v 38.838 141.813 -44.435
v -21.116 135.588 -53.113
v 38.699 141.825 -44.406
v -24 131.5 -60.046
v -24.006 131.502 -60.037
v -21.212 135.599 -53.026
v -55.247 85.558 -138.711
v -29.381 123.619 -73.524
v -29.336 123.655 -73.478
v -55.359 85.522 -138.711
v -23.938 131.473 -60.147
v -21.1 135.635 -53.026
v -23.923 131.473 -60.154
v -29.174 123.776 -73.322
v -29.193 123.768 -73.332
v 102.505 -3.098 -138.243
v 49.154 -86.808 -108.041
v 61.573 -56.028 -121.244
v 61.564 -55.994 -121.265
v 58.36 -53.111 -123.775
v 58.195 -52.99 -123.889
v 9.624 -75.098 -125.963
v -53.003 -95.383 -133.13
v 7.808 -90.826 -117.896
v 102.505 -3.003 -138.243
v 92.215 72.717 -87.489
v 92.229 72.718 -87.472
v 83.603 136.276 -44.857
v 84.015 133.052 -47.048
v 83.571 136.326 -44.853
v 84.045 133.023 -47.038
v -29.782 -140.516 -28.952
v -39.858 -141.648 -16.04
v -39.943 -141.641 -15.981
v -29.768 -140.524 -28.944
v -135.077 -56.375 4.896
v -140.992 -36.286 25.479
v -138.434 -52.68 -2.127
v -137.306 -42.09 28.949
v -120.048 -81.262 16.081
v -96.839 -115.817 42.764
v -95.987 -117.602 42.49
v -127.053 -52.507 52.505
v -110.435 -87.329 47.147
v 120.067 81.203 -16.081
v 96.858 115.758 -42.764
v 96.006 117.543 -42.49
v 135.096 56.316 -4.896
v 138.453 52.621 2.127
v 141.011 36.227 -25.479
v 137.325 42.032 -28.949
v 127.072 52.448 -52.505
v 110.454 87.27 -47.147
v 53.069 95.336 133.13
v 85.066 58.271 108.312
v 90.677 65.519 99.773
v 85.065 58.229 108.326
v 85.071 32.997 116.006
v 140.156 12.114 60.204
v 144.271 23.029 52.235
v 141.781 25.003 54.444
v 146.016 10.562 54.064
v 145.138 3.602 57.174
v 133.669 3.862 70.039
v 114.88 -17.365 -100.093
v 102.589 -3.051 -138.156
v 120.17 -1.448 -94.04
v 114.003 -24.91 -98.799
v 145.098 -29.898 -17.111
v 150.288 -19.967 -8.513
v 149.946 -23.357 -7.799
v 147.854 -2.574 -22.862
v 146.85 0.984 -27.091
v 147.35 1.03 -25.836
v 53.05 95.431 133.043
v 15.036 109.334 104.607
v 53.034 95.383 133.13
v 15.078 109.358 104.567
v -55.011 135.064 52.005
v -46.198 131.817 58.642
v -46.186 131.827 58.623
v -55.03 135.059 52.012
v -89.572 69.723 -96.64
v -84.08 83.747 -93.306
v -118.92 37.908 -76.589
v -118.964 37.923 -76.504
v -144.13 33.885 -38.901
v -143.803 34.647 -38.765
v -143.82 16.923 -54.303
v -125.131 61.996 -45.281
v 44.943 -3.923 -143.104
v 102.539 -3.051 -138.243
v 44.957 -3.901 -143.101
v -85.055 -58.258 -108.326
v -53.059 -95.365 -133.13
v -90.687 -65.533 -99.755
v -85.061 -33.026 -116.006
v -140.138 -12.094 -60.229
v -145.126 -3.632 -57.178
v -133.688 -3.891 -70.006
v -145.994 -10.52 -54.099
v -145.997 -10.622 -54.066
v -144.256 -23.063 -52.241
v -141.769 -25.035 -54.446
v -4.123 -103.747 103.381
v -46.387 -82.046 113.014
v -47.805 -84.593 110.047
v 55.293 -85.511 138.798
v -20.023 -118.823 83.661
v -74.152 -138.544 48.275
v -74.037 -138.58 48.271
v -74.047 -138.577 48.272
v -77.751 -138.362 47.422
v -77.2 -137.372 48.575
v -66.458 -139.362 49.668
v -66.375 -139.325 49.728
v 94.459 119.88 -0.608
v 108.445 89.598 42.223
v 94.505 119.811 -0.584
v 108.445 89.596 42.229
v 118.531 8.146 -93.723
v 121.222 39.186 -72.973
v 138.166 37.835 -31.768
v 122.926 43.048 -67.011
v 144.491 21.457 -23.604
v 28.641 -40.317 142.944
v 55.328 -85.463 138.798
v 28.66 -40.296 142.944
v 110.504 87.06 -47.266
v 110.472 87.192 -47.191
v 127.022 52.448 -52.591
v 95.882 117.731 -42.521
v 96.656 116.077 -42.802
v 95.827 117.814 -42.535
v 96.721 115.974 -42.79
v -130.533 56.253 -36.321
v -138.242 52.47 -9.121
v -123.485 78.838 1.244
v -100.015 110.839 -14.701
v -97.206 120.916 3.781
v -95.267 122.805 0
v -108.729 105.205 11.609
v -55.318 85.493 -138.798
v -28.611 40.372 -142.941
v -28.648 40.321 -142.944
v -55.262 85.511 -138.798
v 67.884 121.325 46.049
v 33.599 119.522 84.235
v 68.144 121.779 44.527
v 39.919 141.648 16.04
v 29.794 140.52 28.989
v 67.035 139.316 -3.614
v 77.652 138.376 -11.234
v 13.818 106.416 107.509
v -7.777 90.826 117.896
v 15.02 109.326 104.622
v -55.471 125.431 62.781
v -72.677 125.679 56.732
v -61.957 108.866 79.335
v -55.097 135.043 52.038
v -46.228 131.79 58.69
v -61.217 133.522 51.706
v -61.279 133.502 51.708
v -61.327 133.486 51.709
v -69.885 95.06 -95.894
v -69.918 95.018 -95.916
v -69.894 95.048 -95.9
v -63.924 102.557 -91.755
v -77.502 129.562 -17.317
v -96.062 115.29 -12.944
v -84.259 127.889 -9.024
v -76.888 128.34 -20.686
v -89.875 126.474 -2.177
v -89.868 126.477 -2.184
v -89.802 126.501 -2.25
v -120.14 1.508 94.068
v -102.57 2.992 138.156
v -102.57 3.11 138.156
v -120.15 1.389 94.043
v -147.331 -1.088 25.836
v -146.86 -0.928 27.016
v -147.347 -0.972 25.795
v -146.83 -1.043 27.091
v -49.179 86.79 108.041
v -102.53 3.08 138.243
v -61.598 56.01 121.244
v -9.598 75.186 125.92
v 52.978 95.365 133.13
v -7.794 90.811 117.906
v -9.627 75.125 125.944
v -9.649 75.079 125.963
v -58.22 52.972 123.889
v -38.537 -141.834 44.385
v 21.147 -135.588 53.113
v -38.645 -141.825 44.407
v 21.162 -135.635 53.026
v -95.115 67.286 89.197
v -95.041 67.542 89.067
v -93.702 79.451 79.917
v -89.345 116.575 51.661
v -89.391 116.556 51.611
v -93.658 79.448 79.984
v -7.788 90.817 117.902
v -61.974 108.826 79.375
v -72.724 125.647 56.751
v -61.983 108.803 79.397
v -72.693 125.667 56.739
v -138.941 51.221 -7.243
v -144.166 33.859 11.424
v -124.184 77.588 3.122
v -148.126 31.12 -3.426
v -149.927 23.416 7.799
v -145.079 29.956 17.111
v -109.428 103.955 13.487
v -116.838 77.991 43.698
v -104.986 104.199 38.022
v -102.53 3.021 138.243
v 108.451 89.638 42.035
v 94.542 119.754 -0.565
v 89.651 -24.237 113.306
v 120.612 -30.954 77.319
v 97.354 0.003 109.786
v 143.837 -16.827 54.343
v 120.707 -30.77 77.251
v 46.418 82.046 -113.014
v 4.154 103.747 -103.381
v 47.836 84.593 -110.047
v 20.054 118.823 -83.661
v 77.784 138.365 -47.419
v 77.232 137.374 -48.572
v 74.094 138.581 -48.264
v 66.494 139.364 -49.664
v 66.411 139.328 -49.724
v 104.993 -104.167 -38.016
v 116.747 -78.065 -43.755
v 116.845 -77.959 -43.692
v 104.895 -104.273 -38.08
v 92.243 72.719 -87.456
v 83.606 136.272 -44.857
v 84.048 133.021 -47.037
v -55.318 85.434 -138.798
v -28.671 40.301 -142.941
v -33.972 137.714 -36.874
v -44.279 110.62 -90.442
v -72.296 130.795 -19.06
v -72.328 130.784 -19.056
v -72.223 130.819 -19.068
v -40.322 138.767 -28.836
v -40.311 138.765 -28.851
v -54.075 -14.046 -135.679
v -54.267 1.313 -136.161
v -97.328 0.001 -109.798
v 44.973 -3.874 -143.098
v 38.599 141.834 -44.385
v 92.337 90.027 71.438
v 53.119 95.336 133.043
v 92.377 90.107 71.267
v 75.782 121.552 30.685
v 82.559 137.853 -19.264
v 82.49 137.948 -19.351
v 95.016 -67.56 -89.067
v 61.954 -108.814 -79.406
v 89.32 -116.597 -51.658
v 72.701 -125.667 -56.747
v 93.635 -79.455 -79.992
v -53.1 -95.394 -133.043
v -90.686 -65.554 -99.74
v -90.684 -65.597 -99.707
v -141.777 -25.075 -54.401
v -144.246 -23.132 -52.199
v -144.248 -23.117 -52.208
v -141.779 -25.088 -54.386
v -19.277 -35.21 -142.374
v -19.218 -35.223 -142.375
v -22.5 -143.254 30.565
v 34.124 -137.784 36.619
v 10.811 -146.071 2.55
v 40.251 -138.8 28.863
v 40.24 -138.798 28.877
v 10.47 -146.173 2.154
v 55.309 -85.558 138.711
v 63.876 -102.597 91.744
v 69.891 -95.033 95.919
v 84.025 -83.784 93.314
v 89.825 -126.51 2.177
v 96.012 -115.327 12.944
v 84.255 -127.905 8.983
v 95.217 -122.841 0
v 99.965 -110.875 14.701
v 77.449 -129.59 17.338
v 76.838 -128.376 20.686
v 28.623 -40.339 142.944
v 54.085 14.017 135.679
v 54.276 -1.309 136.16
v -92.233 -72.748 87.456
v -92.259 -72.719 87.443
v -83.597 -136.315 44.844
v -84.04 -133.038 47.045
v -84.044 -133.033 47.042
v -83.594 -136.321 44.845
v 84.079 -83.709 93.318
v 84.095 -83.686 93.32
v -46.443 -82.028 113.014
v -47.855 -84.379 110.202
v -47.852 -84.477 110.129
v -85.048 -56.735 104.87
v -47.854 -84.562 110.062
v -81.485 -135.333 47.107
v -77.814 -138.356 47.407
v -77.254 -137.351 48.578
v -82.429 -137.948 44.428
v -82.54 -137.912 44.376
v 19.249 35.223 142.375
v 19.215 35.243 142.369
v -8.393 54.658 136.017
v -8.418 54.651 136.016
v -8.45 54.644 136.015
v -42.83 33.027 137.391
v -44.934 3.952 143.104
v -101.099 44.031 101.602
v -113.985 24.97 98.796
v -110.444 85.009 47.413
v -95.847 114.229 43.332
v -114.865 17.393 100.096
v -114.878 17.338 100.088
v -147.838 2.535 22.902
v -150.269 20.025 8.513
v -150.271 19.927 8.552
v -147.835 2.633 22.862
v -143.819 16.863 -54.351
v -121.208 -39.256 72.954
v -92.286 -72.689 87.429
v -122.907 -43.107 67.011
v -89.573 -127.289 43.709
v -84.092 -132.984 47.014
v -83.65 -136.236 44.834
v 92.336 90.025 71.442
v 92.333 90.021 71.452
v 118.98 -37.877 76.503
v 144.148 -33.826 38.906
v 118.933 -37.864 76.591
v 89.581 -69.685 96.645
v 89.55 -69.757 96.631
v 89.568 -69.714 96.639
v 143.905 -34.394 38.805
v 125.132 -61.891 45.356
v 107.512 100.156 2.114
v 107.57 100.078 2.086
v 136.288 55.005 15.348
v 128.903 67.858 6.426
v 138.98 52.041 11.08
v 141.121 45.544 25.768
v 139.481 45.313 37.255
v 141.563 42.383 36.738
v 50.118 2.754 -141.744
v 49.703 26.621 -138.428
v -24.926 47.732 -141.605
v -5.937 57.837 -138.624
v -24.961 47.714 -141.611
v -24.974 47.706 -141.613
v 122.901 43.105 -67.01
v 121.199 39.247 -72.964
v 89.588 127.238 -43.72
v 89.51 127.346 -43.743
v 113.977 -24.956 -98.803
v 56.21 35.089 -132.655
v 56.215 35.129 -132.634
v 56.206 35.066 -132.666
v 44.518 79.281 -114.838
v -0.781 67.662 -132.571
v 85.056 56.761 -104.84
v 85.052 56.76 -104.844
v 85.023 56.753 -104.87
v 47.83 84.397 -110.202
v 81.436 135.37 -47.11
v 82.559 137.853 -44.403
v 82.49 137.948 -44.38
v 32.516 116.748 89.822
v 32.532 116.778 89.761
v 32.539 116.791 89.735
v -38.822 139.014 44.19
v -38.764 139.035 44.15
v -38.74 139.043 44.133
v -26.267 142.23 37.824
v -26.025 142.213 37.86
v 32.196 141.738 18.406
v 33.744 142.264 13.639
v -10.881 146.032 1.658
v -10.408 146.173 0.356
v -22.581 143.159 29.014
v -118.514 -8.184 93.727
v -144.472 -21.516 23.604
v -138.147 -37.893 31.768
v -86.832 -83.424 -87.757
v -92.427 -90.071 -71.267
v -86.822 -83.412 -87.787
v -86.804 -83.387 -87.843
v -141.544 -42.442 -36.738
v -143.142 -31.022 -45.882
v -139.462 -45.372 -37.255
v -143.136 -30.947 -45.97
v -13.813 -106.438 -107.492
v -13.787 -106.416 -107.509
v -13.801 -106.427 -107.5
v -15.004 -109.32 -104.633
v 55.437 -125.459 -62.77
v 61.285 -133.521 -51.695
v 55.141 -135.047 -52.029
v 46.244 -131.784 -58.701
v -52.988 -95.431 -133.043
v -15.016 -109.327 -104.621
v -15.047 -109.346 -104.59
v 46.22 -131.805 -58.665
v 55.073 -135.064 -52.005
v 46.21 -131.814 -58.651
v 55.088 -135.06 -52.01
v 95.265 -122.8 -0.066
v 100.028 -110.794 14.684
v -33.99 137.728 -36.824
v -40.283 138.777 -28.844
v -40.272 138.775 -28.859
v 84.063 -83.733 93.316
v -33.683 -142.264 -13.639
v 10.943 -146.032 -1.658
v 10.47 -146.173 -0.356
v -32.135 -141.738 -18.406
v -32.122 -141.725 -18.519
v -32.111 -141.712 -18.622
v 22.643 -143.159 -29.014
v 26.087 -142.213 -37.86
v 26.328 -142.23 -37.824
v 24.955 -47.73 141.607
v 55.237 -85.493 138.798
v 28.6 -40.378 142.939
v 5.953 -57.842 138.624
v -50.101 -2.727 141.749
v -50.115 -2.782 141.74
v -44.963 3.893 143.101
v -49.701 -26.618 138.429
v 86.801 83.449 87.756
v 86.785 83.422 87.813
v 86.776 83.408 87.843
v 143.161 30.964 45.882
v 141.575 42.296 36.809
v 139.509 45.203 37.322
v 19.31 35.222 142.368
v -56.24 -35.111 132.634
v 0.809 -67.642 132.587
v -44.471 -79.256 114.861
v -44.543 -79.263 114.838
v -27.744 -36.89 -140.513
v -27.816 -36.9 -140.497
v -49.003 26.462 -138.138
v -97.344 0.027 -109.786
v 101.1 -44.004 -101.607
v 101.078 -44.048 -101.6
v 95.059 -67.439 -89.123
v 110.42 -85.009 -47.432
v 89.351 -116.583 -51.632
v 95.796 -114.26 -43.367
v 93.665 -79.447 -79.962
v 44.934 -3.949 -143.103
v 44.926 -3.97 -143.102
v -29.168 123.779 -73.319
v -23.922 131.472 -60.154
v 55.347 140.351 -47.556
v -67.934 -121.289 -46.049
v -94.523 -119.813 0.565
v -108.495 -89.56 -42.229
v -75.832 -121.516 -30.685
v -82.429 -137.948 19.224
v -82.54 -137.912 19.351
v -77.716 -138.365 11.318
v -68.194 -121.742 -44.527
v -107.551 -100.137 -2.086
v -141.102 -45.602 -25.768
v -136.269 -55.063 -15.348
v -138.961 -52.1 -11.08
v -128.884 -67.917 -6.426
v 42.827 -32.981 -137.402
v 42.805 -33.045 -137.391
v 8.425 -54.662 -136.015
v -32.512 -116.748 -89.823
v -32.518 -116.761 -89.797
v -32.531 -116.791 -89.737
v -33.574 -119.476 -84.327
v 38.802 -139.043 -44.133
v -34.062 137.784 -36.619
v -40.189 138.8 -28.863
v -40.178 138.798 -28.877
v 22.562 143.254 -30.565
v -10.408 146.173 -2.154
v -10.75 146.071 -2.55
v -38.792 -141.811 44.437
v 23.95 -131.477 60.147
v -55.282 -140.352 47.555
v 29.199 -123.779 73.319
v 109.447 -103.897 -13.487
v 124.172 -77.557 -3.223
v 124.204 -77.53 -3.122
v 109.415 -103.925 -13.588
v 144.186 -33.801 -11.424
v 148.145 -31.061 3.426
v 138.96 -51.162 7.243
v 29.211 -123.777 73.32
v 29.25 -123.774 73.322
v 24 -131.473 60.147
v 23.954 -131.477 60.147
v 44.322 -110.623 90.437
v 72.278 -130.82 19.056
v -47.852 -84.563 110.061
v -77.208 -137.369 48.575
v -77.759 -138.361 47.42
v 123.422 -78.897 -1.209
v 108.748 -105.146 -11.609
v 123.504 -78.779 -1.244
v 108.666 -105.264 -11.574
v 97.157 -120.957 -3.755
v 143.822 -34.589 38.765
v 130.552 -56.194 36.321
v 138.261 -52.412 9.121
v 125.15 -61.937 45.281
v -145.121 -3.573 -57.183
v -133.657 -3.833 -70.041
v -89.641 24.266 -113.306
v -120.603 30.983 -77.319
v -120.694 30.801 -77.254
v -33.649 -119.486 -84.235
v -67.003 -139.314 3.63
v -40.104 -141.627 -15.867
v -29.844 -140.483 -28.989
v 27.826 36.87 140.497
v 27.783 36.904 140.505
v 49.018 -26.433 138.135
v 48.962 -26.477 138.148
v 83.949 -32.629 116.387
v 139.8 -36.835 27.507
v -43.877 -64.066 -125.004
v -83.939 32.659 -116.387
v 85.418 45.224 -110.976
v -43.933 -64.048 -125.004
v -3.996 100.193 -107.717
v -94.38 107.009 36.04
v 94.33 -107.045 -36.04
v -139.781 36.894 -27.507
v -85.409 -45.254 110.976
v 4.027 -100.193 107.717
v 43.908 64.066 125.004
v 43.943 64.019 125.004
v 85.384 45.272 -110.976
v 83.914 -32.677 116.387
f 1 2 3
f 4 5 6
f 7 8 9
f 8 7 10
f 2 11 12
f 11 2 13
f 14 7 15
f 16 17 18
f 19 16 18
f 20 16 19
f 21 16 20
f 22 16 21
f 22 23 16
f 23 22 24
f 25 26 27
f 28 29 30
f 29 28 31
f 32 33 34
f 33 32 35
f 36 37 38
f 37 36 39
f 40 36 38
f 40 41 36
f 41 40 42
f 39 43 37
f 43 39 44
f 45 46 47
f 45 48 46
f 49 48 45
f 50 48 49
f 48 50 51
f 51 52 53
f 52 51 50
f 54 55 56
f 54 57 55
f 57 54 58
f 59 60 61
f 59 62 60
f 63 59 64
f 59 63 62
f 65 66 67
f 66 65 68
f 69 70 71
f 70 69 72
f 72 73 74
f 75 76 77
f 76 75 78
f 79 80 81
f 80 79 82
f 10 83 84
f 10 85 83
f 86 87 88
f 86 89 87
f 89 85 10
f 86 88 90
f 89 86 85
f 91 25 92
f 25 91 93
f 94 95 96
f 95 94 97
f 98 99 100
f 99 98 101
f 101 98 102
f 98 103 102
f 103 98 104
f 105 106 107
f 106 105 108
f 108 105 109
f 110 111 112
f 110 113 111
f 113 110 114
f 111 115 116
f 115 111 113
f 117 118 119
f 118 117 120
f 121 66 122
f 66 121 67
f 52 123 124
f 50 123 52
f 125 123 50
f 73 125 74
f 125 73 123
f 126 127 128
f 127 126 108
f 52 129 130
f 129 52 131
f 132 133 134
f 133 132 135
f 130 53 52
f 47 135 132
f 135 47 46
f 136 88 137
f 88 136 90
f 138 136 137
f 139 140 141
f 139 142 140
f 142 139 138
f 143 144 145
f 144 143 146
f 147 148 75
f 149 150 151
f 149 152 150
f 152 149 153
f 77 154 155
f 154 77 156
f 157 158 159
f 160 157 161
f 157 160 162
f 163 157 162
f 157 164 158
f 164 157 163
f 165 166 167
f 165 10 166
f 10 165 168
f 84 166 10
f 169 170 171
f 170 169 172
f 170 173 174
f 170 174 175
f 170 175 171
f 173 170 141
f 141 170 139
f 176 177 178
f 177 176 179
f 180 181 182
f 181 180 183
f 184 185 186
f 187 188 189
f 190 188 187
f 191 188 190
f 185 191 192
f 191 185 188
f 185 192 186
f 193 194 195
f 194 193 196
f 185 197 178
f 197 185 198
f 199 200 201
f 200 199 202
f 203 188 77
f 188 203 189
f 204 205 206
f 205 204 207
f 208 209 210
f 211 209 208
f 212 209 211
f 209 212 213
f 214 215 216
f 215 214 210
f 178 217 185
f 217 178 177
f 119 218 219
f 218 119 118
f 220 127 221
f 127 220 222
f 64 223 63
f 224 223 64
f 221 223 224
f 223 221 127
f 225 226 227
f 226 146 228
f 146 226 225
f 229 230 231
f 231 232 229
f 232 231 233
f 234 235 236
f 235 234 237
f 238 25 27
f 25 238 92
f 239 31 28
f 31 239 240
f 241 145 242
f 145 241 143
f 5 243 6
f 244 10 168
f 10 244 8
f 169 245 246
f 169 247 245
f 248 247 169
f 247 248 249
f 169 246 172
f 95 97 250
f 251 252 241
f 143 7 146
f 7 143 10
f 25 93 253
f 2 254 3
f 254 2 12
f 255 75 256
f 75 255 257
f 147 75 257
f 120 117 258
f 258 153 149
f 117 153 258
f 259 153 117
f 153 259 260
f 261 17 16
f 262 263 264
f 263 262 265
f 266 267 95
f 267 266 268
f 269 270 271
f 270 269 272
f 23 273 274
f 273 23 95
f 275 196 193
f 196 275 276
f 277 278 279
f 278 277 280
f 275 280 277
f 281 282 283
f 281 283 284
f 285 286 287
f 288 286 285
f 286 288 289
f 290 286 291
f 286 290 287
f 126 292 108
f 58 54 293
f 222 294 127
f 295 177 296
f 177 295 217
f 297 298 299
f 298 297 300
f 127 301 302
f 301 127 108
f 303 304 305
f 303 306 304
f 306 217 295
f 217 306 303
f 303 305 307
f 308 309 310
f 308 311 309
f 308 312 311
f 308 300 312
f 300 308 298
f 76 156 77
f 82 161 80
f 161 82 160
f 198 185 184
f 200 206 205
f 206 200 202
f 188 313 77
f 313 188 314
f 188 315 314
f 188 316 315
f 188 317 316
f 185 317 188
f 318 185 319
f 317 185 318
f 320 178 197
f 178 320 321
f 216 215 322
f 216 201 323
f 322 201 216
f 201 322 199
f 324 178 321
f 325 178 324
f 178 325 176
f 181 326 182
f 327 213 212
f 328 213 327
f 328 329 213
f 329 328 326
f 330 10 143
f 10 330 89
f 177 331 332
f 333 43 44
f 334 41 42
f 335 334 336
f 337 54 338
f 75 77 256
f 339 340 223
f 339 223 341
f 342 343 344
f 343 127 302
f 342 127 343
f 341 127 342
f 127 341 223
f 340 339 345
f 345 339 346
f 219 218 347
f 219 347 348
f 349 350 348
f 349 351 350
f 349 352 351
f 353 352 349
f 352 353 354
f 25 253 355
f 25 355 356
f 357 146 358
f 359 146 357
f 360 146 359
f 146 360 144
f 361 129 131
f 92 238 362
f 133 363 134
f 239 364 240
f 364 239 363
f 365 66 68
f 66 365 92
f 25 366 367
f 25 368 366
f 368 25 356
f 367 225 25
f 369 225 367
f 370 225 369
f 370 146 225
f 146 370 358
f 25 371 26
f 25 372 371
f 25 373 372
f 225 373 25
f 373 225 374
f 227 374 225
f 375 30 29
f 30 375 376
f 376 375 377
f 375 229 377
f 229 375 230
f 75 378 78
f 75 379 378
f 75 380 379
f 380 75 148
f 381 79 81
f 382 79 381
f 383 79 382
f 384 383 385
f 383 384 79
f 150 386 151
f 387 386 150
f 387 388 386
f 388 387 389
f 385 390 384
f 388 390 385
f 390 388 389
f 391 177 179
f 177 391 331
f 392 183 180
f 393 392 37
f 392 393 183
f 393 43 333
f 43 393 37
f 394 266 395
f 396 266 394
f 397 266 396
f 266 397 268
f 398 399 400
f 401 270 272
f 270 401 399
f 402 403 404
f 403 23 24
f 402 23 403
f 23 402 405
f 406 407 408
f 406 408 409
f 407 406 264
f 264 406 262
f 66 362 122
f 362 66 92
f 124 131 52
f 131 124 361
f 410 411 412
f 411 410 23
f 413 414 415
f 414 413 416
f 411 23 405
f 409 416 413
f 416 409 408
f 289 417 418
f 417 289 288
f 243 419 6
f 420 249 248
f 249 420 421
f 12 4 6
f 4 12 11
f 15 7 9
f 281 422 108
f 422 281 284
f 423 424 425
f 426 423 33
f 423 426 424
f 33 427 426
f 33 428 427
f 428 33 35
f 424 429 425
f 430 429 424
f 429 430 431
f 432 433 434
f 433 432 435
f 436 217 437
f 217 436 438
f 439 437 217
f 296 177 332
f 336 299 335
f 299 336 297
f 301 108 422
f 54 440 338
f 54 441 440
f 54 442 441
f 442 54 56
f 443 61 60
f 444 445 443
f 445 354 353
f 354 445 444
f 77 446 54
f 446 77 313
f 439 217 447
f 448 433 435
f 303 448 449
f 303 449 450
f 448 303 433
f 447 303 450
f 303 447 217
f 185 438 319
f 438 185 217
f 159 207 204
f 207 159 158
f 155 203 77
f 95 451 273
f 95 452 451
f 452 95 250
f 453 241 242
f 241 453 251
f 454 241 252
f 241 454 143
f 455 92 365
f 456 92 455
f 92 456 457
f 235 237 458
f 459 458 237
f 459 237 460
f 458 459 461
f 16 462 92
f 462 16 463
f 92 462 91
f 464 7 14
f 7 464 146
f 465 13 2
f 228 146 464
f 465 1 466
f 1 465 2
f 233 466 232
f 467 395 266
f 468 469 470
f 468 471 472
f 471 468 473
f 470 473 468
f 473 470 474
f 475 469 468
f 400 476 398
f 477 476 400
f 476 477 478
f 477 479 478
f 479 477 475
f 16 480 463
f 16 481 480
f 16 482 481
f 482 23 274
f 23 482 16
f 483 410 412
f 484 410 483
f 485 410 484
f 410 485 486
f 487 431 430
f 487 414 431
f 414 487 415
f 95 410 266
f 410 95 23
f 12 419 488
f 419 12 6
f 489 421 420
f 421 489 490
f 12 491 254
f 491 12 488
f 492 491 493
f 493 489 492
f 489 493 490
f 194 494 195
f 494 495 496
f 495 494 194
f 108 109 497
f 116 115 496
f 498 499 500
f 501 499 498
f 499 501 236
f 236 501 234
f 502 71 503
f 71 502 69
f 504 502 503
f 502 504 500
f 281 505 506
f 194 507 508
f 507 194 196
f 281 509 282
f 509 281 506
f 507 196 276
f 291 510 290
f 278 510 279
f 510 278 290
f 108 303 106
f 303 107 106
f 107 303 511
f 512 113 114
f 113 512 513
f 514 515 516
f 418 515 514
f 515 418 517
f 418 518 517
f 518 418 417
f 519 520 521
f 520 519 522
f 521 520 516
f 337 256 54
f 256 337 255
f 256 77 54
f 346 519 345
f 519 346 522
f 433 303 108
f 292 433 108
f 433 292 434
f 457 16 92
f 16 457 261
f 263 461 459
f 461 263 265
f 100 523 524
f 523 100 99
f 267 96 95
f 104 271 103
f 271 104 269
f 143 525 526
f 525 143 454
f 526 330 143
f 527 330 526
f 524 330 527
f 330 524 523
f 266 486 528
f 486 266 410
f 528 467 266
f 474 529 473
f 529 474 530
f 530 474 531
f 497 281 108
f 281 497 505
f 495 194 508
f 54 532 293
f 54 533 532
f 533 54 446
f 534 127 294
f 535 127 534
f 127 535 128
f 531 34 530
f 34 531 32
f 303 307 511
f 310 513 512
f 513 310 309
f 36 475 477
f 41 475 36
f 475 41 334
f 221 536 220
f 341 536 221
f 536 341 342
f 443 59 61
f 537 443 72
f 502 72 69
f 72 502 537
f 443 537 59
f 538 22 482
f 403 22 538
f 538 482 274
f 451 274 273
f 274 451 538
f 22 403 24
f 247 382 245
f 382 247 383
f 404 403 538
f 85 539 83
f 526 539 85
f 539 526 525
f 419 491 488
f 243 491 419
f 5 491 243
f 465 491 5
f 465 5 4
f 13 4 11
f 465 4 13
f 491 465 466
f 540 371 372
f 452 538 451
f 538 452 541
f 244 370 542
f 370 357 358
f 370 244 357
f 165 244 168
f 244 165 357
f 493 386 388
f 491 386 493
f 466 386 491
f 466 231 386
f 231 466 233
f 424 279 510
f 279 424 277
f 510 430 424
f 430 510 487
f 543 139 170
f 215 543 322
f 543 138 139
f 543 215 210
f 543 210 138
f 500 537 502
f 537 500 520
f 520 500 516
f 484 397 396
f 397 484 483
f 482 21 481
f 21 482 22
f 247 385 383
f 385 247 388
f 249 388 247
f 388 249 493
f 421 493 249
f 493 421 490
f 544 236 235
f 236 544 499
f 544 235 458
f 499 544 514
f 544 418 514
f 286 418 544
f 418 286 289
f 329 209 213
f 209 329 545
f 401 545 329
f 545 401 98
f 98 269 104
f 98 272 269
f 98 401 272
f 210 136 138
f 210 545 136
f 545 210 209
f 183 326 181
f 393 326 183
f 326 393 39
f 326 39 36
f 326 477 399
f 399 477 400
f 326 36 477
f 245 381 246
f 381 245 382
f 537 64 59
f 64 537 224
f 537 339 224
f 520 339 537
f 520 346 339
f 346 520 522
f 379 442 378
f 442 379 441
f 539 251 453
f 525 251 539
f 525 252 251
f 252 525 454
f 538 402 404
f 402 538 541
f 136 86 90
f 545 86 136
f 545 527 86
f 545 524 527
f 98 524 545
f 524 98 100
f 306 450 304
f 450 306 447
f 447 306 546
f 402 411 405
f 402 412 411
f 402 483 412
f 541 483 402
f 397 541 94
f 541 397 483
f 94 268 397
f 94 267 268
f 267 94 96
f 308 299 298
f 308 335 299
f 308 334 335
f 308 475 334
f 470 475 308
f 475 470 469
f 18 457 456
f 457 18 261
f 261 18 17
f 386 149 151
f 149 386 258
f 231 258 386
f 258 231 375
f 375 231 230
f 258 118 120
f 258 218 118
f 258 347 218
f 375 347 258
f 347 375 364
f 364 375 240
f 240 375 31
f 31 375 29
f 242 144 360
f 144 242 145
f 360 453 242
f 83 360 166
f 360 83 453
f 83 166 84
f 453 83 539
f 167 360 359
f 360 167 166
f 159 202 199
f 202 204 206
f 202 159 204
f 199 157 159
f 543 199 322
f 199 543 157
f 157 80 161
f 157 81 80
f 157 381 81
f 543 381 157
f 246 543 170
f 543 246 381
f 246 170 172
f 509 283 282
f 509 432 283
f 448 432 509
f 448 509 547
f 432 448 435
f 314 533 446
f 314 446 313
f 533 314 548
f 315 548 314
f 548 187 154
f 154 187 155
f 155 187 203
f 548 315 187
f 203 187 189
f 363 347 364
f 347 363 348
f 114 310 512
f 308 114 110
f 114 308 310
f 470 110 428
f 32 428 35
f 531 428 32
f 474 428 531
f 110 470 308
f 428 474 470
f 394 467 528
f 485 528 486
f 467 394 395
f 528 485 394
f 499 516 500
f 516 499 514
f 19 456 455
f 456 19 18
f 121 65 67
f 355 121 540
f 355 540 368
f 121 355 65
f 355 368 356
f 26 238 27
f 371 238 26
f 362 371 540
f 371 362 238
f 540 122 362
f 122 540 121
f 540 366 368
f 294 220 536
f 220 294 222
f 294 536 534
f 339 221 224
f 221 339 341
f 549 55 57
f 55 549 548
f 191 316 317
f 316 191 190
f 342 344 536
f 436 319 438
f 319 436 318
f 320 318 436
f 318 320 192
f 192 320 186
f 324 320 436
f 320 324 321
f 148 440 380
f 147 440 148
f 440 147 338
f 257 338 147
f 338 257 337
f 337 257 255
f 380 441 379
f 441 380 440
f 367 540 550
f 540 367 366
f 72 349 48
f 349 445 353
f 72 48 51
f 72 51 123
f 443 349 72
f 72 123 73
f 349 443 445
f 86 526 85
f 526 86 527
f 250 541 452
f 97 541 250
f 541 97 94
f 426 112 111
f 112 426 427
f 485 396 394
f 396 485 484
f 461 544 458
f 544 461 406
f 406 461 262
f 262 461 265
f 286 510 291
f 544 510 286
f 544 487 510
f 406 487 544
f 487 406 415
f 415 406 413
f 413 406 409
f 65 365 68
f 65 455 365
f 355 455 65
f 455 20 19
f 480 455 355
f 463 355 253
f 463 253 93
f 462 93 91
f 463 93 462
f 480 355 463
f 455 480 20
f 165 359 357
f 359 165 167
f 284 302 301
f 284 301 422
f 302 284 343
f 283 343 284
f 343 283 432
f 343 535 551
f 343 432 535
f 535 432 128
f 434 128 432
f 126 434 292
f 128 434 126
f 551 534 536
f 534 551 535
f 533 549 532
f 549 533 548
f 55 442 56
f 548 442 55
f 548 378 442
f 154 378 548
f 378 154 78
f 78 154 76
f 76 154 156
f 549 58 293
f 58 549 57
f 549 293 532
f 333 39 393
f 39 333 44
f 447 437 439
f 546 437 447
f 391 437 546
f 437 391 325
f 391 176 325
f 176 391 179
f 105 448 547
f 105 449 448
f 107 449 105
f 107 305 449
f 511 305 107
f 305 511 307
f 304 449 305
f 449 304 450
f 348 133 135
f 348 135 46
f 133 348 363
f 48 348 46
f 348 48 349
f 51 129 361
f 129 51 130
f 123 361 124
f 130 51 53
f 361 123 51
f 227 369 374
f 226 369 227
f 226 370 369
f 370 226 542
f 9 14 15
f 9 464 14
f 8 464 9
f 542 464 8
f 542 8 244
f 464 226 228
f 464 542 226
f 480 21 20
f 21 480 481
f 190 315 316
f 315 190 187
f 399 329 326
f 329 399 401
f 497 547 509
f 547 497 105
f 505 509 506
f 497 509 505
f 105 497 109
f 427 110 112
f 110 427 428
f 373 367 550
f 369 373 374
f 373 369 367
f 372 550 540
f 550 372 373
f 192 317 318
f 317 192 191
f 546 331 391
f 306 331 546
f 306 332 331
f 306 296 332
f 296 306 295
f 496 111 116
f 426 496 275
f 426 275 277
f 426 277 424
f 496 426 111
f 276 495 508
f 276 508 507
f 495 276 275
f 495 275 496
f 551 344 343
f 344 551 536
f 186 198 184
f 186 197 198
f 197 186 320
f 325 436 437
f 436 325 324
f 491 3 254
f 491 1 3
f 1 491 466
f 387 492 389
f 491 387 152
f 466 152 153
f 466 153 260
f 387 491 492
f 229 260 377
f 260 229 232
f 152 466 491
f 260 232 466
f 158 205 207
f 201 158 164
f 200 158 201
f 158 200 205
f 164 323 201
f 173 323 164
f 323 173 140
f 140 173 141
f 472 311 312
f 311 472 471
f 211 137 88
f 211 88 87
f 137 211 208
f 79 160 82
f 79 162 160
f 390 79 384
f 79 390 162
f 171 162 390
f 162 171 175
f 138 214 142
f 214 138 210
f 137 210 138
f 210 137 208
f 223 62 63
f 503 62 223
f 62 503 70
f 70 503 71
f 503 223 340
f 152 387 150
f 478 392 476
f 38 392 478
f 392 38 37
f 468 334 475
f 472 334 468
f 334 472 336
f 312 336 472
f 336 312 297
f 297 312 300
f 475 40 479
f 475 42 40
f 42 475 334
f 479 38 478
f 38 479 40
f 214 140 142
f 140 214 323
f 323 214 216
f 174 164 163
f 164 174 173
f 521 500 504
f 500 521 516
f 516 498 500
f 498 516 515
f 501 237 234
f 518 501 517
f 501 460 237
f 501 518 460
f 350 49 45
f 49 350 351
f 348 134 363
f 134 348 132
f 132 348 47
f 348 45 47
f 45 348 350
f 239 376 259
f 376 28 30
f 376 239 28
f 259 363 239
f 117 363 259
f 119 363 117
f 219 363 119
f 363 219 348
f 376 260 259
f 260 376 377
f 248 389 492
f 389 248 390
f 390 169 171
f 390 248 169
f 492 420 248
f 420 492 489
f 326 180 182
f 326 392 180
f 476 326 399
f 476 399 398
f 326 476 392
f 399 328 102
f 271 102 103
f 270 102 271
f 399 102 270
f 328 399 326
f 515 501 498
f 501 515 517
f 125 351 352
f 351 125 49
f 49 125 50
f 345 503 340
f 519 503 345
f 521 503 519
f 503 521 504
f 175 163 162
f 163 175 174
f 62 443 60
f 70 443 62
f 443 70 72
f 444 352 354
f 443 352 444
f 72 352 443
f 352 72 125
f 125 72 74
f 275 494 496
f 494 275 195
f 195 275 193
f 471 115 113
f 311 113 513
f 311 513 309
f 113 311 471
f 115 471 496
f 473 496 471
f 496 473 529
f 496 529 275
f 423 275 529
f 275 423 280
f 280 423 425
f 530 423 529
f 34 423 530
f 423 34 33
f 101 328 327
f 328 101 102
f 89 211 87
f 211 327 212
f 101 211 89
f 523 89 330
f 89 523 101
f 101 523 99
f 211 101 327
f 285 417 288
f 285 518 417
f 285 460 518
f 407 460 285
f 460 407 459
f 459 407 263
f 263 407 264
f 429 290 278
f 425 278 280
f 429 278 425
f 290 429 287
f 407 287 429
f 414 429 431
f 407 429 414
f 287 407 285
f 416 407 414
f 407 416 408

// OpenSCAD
// Auto-generated OpenSCAD file

    inner_points = 50*[[3.0282854772205288, -0.5746120397610971, -1.529535228743129], [-1.9570390816772223, 2.488720185113206, -1.3477536187106098], [1.9570390816772214, -2.488720185113205, 1.3477536187106098], [-3.0282854772205297, 0.5746120397610984, 1.529535228743129], [1.6491882886842126, 2.7570563880831456, -1.2324723141499903], [0.08412478963067203, 0.3400356492395892, -3.423078836481171], [-0.08412478963067273, -0.34003564923958784, 3.423078836481171], [-1.6491882886842135, -2.7570563880831447, 1.2324723141499903], [2.8067129791844274, 1.0087891365785524, 1.7160642977896399], [-0.27438704316396, 2.9020325703837075, 1.8284115113194153], [0.27438704316395934, -2.9020325703837067, -1.8284115113194153], [-2.8067129791844283, -1.008789136578551, -1.7160642977896399], [2.793992253010594, -0.7366978719134406, 0.5501480097562201], [-1.8859757024280626, 2.13900189043946, 0.7207952965656333], [1.8859757024280617, -2.139001890439459, -0.7207952965656333], [-2.793992253010595, 0.7366978719134419, -0.5501480097562201], [1.7073672208446276, 0.9044860907197378, -2.217787497007674], [-0.0802214718725859, 2.0029056584985505, -2.1526060335344295], [0.0802214718725852, -2.0029056584985496, 2.1526060335344295], [-1.7073672208446284, -0.9044860907197365, 2.217787497007674], [1.4993662816149618, 2.3909022063260266, 0.829015494635175], [-0.8778519101575467, -1.2803773767356506, -2.4983572790896065], [0.877851910157546, 1.2803773767356519, 2.4983572790896065], [-1.4993662816149627, -2.3909022063260257, -0.829015494635175], [2.6836061407130223, 1.1442811447947425, -0.37504405101045624], [-0.20877312200842071, 2.9215613393688296, -0.2695782276742873], [1.214404499523046, -1.124694419740917, -2.4314735184133838], [-1.6779747631983963, 0.6525857748331707, -2.326007695077215], [1.6779747631983954, -0.6525857748331694, 2.326007695077215], [-1.214404499523047, 1.1246944197409183, 2.4314735184133838], [0.20877312200842, -2.9215613393688287, 0.2695782276742873], [-2.683606140713023, -1.1442811447947412, 0.37504405101045624]];

    outer_points = 50*[[1.7170405994415567, -2.925385609292255, -0.5779797233161679], [1.6439459750532173, 2.925385609292255, -0.7614004280282365], [-1.6439459750532173, -2.925385609292255, 0.7614004280282365], [-1.7170405994415567, 2.925385609292255, 0.5779797233161679], [3.3884043056895363, 0.06101499591362604, 0.5959558500490982], [2.049786207575088, -0.06101499591362604, -2.7631184587813227], [-2.049786207575088, 0.06101499591362604, 2.7631184587813227], [-3.3884043056895363, -0.06101499591362604, -0.5959558500490982], [1.10555227148591, -1.7092633995307511, 2.774228316088349], [1.0603773092190094, 1.9067120739541168, 2.660868086335833], [-1.0603773092190094, -1.9067120739541168, -2.660868086335833], [-1.10555227148591, 1.7092633995307511, -2.774228316088349], [0.4226276221095006, -2.7108029257139314, 1.0605247229436006], [0.35401012372783297, 2.7816021311861725, 0.8883387378035981], [-0.35401012372783297, -2.7816021311861725, -0.8883387378035981], [-0.4226276221095006, 2.7108029257139314, -1.0605247229436006], [2.56565246249082, -1.0489560258770196, -0.9843261626589144], [2.5394429103320135, 1.0489560258770196, -1.050095356596011], [-2.5394429103320135, -1.0489560258770196, 1.050095356596011], [-2.56565246249082, 1.0489560258770196, 0.9843261626589144], [1.991618466078374, 0.09267736315140723, 2.162555453378865], [-0.04164554946986787, -0.09267736315140723, -2.939635326290048], [0.04164554946986787, 0.09267736315140723, 2.939635326290048], [-1.991618466078374, -0.09267736315140723, -2.162555453378865], [2.2270783360740483, -1.6399687421577454, 1.0012012318904389], [2.1846703898511866, 1.7545242629883189, 0.8947844406875329], [0.9704520663631402, -1.7545242629883189, -2.1521260870312755], [0.9280441201402786, 1.6399687421577454, -2.258542878234181], [-0.9280441201402786, -1.6399687421577454, 2.258542878234181], [-0.9704520663631402, 1.7545242629883189, 2.1521260870312755], [-2.1846703898511866, -1.7545242629883189, -0.8947844406875329], [-2.2270783360740483, 1.6399687421577454, -1.0012012318904389]];

    // Convex hull for inner set (I)
    module inner_hull() {
        hull() {
            for (p = inner_points) {
                translate(p) sphere(r=0.1);
            }
        }
    }

    // Convex hull for outer set (O) minus inner hull (O \ I)
    module outer_minus_inner() {
        difference() {
            hull() {
                for (p = outer_points) {
                    translate(p) sphere(r=0.1);
                }
            }
            inner_hull(); // Subtract inner hull
        }
    }

    // Convex hull for outer set (O) minus all translated inner hulls
    module outer_minus_AllTranslationInner() {
        difference() {
            hull() {
                for (p = outer_points) {
                    translate(p) sphere(r=0.1);
                }
            }
            hull() {
                translate([0,0,50]) inner_hull();
                translate([0,0,-50]) inner_hull();
            }; // Subtract translated inner hulls
        }
    }

    // Difference between outer_minus_inner and outer_minus_AllTranslationInner
    module outer_minus_inner_diff() {
        difference() {
            // Outer minus inner
            difference() {
                hull() {
                    for (p = outer_points) {
                        translate(p) sphere(r=0.1);
                    }
                }
                inner_hull();
            }

            // Subtract Outer minus AllTranslationInner
            difference() {
                hull() {
                    for (p = outer_points) {
                        translate(p) sphere(r=0.1);
                    }
                }
                hull() {
                    translate([0,0,50]) inner_hull();
                    translate([0,0,-50]) inner_hull();
                };
            }
        }
    }

    // Rendering all with colors applied
    // color([1, 0, 0, 0.5]) inner_hull(); // Transparent red
    // color([0, 0, 1, 1]) outer_minus_inner(); // Opaque blue
    // color([0, 1, 0, 1]) outer_minus_AllTranslationInner(); // Opaque green
    color([1, 1, 0, 1]) outer_minus_inner_diff(); // Opaque yellow
    
